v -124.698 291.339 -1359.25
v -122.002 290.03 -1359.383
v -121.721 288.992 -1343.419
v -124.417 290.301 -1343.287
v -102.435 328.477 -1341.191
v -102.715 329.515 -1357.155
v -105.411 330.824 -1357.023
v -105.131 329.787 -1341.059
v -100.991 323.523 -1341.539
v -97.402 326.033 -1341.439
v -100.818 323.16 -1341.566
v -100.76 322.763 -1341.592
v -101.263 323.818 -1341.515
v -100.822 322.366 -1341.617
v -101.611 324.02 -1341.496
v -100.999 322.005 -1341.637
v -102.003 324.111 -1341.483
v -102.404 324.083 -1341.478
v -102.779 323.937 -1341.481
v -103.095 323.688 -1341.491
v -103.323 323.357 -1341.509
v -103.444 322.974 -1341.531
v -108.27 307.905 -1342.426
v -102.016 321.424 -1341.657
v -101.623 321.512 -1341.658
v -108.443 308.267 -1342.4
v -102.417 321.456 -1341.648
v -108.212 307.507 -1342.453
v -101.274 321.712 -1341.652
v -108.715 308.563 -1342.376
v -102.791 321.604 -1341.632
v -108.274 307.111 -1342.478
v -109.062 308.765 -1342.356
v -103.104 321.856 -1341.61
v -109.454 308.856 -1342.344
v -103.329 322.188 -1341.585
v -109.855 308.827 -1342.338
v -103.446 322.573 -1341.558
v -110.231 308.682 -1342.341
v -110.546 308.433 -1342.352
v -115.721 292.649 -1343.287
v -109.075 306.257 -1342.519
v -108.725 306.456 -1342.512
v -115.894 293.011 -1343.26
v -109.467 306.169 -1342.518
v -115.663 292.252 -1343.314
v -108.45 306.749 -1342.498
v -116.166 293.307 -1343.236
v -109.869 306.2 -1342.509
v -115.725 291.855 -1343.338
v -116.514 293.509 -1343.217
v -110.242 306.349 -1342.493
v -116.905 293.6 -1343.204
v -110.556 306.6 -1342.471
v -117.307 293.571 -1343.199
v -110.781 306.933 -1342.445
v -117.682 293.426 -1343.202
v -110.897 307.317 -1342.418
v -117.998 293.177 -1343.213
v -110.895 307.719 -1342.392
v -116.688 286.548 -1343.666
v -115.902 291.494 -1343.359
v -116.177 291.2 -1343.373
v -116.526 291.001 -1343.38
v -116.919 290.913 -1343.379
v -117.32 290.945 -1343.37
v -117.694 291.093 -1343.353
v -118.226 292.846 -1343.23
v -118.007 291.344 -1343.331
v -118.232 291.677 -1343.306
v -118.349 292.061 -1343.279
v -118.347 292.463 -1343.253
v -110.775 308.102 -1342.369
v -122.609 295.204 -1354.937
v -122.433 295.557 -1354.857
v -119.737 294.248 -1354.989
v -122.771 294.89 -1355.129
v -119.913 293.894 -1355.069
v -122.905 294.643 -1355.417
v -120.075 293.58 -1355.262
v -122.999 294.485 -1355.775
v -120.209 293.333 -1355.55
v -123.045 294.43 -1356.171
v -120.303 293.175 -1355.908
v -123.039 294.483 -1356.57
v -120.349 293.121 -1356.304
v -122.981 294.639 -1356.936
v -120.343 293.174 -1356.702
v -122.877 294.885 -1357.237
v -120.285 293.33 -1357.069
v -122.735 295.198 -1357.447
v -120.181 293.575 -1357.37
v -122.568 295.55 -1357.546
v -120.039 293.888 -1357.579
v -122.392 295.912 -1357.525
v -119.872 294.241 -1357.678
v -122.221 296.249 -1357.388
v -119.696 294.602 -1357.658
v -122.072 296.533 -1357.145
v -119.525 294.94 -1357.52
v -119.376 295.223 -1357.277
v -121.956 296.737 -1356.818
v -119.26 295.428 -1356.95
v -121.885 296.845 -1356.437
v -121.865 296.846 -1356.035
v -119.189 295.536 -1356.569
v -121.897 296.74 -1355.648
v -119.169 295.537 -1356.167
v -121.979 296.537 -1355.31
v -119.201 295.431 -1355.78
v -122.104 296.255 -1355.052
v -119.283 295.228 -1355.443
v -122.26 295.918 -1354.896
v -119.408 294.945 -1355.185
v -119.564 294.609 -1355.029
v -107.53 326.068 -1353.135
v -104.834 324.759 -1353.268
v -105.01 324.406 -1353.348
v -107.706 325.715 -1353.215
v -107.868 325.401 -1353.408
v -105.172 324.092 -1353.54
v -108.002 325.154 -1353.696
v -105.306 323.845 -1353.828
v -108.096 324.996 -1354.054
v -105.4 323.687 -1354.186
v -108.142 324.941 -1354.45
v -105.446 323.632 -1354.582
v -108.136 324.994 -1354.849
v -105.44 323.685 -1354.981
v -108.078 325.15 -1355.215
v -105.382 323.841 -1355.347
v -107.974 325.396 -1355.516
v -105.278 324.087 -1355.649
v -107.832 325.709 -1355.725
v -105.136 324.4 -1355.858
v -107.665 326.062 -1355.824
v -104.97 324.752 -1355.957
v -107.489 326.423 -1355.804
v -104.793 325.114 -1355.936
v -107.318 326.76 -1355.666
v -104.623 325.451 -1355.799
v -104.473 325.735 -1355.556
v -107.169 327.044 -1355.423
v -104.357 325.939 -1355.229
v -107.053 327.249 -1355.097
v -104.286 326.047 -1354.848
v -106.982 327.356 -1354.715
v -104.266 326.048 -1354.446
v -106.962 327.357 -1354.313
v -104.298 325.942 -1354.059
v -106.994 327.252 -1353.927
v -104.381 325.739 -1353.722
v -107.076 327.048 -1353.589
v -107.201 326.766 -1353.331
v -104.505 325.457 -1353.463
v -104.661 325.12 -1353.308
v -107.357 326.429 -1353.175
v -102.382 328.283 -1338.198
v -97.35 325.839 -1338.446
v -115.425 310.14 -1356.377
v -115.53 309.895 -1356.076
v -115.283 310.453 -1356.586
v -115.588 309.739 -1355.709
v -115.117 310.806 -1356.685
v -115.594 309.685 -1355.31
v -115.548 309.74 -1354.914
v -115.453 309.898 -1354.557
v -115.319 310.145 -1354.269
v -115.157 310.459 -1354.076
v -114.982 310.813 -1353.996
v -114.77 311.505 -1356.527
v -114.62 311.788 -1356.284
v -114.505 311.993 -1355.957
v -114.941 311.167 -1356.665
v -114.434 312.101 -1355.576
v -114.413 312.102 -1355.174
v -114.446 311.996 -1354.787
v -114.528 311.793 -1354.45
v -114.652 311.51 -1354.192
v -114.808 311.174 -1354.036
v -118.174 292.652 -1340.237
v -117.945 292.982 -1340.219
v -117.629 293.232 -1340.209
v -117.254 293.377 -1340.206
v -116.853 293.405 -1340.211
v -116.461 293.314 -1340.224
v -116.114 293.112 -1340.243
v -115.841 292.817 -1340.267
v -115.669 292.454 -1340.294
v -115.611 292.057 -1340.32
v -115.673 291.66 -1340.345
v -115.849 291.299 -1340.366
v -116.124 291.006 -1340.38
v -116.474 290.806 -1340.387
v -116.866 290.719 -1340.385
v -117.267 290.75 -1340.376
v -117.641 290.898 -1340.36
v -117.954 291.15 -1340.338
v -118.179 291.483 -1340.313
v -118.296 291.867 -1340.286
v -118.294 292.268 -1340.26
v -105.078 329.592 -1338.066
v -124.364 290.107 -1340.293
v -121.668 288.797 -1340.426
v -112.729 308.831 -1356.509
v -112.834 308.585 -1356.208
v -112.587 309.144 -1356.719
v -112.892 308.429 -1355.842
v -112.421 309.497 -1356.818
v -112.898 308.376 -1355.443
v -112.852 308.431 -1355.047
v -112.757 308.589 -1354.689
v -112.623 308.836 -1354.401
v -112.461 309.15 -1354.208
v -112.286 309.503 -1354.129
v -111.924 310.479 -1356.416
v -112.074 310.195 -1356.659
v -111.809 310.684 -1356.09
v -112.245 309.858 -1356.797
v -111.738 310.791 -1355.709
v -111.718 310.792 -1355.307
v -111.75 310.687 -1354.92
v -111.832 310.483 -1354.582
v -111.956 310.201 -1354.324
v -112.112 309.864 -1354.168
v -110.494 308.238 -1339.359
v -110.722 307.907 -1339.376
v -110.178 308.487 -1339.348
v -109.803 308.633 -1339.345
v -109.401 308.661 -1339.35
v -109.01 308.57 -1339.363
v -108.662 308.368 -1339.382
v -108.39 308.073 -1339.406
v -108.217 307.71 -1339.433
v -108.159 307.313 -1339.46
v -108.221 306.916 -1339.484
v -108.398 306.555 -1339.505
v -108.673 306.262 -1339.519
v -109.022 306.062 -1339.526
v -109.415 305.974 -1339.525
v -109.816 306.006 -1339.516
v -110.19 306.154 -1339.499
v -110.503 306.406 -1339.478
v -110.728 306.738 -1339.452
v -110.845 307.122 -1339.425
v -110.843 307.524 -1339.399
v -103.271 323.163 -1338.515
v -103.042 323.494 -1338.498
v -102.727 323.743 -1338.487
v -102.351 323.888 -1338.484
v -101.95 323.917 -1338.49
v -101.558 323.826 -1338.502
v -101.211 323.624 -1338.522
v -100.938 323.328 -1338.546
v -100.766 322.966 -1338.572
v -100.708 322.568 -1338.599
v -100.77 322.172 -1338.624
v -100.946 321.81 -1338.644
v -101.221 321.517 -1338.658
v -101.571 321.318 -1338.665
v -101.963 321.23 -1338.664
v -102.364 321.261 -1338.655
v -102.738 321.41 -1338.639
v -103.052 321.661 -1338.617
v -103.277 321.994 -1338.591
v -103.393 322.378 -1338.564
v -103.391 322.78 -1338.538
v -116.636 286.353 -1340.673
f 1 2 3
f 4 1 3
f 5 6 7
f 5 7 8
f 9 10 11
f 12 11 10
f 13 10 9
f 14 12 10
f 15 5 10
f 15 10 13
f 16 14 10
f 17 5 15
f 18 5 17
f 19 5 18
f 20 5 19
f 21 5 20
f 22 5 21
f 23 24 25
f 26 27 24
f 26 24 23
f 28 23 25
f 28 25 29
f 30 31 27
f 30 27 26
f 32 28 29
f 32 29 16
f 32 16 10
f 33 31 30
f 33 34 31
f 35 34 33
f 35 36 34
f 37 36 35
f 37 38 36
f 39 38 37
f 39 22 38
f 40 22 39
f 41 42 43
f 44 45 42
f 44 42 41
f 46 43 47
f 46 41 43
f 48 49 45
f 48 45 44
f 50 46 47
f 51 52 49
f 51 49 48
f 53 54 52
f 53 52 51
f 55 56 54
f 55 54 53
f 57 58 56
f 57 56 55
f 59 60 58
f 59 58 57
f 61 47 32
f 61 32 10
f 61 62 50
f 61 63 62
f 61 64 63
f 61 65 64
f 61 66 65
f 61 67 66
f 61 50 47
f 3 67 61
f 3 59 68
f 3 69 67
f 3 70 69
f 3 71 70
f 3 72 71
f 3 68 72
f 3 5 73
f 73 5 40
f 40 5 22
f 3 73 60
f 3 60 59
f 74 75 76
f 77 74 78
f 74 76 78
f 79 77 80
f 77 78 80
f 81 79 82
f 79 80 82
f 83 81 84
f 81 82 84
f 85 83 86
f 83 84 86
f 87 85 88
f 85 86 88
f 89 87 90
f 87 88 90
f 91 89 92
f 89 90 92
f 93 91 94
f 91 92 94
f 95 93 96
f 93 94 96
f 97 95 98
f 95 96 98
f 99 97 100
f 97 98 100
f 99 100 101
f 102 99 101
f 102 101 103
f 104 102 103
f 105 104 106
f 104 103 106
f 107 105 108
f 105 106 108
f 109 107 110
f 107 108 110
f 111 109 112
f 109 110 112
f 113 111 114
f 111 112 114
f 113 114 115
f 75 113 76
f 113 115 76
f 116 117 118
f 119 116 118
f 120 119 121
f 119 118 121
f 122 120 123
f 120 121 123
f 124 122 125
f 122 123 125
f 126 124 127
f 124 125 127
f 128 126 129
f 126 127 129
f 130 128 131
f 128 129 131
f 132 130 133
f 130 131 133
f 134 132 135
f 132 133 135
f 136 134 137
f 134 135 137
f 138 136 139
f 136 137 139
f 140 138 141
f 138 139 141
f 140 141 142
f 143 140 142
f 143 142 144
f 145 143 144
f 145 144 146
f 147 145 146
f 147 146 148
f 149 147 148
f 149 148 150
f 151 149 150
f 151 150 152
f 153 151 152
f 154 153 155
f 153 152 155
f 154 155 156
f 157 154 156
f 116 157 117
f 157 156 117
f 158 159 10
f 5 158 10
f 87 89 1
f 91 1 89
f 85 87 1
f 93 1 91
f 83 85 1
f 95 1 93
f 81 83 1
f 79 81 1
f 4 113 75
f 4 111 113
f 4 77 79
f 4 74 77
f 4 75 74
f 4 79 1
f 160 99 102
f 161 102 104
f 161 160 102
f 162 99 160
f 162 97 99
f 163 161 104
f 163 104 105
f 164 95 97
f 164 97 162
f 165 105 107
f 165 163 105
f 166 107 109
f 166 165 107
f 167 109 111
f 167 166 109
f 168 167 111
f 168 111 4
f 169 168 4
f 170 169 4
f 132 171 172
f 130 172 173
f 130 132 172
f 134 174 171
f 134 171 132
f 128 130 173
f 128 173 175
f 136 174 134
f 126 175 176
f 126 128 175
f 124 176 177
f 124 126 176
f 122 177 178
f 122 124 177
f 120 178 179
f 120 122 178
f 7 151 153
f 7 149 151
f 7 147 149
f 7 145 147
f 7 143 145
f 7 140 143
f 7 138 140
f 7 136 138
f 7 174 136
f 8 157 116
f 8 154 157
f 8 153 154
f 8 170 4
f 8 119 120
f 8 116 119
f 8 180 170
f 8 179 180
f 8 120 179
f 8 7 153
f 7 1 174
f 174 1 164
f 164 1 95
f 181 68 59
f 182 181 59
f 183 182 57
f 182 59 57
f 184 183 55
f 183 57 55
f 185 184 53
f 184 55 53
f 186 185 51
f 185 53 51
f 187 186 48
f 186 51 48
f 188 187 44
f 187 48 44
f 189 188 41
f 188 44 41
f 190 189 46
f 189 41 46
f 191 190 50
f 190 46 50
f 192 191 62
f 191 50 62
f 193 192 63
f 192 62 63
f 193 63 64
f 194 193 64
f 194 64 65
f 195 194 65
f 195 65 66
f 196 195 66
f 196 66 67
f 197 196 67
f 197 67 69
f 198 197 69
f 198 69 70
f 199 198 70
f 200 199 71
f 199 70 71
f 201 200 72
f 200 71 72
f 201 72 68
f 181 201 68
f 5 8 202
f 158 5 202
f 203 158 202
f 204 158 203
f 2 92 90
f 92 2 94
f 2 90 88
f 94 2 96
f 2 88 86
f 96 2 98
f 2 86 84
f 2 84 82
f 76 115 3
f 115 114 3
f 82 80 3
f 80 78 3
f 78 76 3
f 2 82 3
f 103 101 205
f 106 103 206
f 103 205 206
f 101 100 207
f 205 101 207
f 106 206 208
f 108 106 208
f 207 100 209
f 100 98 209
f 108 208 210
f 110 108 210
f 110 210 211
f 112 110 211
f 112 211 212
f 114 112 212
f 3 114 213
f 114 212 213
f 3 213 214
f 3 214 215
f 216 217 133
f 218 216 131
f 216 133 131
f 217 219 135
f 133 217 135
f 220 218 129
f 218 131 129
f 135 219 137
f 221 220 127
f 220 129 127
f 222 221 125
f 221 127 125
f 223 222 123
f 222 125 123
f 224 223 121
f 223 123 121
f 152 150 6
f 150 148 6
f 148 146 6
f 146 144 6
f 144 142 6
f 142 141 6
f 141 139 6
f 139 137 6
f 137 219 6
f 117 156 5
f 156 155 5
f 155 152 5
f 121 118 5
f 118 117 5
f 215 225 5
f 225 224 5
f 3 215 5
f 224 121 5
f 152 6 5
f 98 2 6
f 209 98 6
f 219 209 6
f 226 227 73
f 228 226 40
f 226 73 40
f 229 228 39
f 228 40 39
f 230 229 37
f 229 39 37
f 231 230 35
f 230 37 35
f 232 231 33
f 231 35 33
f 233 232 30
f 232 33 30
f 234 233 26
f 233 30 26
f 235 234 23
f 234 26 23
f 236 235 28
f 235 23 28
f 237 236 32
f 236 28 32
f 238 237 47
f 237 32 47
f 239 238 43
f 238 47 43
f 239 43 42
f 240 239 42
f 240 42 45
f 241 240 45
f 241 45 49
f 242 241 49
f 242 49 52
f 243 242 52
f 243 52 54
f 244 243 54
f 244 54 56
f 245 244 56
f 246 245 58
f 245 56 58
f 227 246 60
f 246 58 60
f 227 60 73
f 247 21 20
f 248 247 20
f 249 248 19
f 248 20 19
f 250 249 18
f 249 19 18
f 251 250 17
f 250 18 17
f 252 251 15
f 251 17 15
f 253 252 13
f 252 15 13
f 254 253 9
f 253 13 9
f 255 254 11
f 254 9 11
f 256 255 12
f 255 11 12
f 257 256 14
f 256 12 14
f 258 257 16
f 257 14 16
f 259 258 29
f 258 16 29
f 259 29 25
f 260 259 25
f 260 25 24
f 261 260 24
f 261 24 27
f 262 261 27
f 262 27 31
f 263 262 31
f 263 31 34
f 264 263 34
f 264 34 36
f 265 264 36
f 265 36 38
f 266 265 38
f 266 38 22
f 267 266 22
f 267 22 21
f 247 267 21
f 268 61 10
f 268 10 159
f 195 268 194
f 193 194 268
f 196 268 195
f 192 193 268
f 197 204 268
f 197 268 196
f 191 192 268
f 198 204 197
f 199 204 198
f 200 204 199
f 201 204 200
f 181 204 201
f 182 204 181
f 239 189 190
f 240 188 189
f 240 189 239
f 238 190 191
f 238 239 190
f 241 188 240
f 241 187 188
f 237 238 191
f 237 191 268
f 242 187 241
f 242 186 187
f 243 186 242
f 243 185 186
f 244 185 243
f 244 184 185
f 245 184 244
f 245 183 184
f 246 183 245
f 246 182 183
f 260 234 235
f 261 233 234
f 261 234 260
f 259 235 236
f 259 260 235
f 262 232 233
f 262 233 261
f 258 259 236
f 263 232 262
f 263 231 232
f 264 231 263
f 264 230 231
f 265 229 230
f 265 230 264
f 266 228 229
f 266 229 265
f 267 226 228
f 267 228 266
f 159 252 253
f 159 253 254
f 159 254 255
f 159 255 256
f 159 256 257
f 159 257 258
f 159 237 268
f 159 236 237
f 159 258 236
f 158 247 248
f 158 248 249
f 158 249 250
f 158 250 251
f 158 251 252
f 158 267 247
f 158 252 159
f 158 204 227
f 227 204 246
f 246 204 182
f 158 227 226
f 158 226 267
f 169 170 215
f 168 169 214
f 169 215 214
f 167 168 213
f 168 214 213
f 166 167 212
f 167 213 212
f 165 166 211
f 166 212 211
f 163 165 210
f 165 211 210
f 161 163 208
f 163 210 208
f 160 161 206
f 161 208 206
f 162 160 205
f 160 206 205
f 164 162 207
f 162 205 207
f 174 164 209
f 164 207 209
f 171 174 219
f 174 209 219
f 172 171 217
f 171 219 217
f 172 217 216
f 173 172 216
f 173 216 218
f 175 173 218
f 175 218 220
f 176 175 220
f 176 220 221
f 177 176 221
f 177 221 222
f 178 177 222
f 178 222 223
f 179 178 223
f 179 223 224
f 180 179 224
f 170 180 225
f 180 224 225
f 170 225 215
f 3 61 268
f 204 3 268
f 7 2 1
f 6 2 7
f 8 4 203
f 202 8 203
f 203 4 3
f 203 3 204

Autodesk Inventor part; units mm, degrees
ref_plane "YZ Plane" through (0, 0, 0) normal (1, 0, 0) x (0, 1, 0)
ref_plane "Work Plane1" through (-107.0936, 321.7811, -1369.8087) normal (-0.8986472, 0.4364419, 0.044177) x (0.0175477, -0.0648608, 0.99774)
sketch "Sketch2" plane through (-107.0936, 321.7811, -1369.8087) normal (-0.8986472, 0.4364419, 0.044177) x (0.0175477, -0.0648608, 0.99774)
  circle A0 centre (15, 4.5) radius 1.35 projected
  circle A1 centre (15, -12.5) radius 1.35 projected
  circle A2 centre (15, -29.5) radius 1.35 projected
  line L0 (17.8, -32.6) -> (17.8, 6) projected
  line L1 (12.2, -30) -> (12.2, 9) projected
  line L2 (12.2, -34.5) -> (12.2, 9.5)
  circle A3 centre (15, 4.5) radius 1.35
  circle A4 centre (15, -12.5) radius 1.35
  circle A5 centre (15, -29.5) radius 1.35
  line L3 (12.2, 9.5) -> (31.2, 9.5)
  line L4 (12.2, -34.5) -> (31.2, -34.5)
  line L5 (31.2, 6) -> (31.2, -32.6) projected
  line L6 (31.2, -32.6) -> (35.7, -32.6) projected
  line L7 (35.7, -31.975) -> (35.7, -32.6) projected
  line L8 (33.7, -31.975) -> (35.7, -31.975) projected
  line L9 (33.7, -27.025) -> (33.7, -31.975) projected
  line L10 (35.7, -27.025) -> (33.7, -27.025) projected
  line L11 (35.7, -25.525) -> (35.7, -27.025) projected
  line L12 (33.2, -25.525) -> (35.7, -25.525) projected
  line L13 (33.2, -16.475) -> (33.2, -25.525) projected
  line L14 (35.7, -16.475) -> (33.2, -16.475) projected
  line L15 (35.7, -14.975) -> (35.7, -16.475) projected
  line L16 (33.7, -14.975) -> (35.7, -14.975) projected
  line L17 (33.7, -10.025) -> (33.7, -14.975) projected
  line L18 (35.7, -10.025) -> (33.7, -10.025) projected
  line L19 (35.7, -8.525) -> (35.7, -10.025) projected
  line L20 (33.2, -8.525) -> (35.7, -8.525) projected
  line L21 (33.2, 0.525) -> (33.2, -8.525) projected
  line L22 (35.7, 0.525) -> (33.2, 0.525) projected
  line L23 (35.7, 2.025) -> (35.7, 0.525) projected
  line L24 (33.7, 2.025) -> (35.7, 2.025) projected
  line L25 (33.7, 6) -> (33.7, 2.025) projected
  line L26 (33.7, 6) -> (31.2, 6) projected
  line L27 (31.2, 9.5) -> (31.2, -34.5)
  line L28 (28.2, 9.5) -> (28.2, -34.5)
  dimension "d1" = 2.7
  dimension "d2" = 2.7
  dimension "d3" = 2.7
  dimension "d6" = 5
  dimension "d8" = 5
  dimension "d13" = 3
extrude "Extrusion2" add sketch "Sketch2" along normal blind 3 contours L1 L2 L3 L28 L4 | L28 L3 L27 L5 L4
sketch "Sketch3" plane through (-107.0936, 321.7811, -1369.8087) normal (0.8986472, -0.4364419, -0.044177) x (-0.0175477, 0.0648608, -0.99774)
  circle A0 centre (-15, 4.5) radius 1.35 projected
  circle A1 centre (-15, -29.5) radius 1.35 projected
  circle A2 centre (-15, -12.5) radius 1.35 projected
  line L0 (-31.2, -34.5) -> (-31.2, 9.5) projected
  line L1 (-12.2, -34.5) -> (-31.2, -34.5) projected
  line L2 (-12.2, 9.5) -> (-12.2, -34.5) projected
  line L3 (-31.2, 9.5) -> (-12.2, 9.5) projected
  point P0 (-1389.4632, -172.471)
sketch "Sketch4" plane through (-109.7896, 323.0904, -1369.6761) normal (-0.8986472, 0.4364419, 0.044177) x (0.0175477, -0.0648608, 0.99774)
  line L0 (12.2, -34.5) -> (31.2, -34.5) projected
  line L1 (31.2, 9.5) -> (28.2, 9.5)
  line L2 (28.2, 9.5) -> (28.2, -34.5)
  line L3 (28.2, -34.5) -> (31.2, -34.5)
  line L4 (31.2, -34.5) -> (31.2, 9.5)
  dimension "d16" = 3
ref_plane "Work Plane2" through (-113.4024, 293.0987, -1341.5395) normal (-0.8986472, 0.4364419, 0.044177) x (0.0175477, -0.0648608, 0.99774)
extrude "Extrusion3" add sketch "Sketch4" against normal up to surface (8.6 mm away)
sketch "Sketch5" plane through (-121.7209, 288.992, -1343.4191) normal (-0.0175477, 0.0648608, -0.99774) x (-0.8986472, 0.4364419, 0.044177)
  circle A0 centre (-2.8, 39) radius 1.35 projected
  circle A1 centre (-2.8, 22) radius 1.35 projected
  circle A2 centre (-2.8, 5) radius 1.35 projected
  circle A3 centre (-2.8, 5) radius 1.35
  circle A4 centre (-2.8, 22) radius 1.35
  circle A5 centre (-2.8, 39) radius 1.35
  point P0 (-176.1642, -137.971)
  dimension "d19" = 2.7
  dimension "d20" = 2.7
  dimension "d21" = 2.7
extrude "Extrusion4" cut sketch "Sketch5" against normal through all
properties part number "Trapezium" material "Aluminum-6061"
